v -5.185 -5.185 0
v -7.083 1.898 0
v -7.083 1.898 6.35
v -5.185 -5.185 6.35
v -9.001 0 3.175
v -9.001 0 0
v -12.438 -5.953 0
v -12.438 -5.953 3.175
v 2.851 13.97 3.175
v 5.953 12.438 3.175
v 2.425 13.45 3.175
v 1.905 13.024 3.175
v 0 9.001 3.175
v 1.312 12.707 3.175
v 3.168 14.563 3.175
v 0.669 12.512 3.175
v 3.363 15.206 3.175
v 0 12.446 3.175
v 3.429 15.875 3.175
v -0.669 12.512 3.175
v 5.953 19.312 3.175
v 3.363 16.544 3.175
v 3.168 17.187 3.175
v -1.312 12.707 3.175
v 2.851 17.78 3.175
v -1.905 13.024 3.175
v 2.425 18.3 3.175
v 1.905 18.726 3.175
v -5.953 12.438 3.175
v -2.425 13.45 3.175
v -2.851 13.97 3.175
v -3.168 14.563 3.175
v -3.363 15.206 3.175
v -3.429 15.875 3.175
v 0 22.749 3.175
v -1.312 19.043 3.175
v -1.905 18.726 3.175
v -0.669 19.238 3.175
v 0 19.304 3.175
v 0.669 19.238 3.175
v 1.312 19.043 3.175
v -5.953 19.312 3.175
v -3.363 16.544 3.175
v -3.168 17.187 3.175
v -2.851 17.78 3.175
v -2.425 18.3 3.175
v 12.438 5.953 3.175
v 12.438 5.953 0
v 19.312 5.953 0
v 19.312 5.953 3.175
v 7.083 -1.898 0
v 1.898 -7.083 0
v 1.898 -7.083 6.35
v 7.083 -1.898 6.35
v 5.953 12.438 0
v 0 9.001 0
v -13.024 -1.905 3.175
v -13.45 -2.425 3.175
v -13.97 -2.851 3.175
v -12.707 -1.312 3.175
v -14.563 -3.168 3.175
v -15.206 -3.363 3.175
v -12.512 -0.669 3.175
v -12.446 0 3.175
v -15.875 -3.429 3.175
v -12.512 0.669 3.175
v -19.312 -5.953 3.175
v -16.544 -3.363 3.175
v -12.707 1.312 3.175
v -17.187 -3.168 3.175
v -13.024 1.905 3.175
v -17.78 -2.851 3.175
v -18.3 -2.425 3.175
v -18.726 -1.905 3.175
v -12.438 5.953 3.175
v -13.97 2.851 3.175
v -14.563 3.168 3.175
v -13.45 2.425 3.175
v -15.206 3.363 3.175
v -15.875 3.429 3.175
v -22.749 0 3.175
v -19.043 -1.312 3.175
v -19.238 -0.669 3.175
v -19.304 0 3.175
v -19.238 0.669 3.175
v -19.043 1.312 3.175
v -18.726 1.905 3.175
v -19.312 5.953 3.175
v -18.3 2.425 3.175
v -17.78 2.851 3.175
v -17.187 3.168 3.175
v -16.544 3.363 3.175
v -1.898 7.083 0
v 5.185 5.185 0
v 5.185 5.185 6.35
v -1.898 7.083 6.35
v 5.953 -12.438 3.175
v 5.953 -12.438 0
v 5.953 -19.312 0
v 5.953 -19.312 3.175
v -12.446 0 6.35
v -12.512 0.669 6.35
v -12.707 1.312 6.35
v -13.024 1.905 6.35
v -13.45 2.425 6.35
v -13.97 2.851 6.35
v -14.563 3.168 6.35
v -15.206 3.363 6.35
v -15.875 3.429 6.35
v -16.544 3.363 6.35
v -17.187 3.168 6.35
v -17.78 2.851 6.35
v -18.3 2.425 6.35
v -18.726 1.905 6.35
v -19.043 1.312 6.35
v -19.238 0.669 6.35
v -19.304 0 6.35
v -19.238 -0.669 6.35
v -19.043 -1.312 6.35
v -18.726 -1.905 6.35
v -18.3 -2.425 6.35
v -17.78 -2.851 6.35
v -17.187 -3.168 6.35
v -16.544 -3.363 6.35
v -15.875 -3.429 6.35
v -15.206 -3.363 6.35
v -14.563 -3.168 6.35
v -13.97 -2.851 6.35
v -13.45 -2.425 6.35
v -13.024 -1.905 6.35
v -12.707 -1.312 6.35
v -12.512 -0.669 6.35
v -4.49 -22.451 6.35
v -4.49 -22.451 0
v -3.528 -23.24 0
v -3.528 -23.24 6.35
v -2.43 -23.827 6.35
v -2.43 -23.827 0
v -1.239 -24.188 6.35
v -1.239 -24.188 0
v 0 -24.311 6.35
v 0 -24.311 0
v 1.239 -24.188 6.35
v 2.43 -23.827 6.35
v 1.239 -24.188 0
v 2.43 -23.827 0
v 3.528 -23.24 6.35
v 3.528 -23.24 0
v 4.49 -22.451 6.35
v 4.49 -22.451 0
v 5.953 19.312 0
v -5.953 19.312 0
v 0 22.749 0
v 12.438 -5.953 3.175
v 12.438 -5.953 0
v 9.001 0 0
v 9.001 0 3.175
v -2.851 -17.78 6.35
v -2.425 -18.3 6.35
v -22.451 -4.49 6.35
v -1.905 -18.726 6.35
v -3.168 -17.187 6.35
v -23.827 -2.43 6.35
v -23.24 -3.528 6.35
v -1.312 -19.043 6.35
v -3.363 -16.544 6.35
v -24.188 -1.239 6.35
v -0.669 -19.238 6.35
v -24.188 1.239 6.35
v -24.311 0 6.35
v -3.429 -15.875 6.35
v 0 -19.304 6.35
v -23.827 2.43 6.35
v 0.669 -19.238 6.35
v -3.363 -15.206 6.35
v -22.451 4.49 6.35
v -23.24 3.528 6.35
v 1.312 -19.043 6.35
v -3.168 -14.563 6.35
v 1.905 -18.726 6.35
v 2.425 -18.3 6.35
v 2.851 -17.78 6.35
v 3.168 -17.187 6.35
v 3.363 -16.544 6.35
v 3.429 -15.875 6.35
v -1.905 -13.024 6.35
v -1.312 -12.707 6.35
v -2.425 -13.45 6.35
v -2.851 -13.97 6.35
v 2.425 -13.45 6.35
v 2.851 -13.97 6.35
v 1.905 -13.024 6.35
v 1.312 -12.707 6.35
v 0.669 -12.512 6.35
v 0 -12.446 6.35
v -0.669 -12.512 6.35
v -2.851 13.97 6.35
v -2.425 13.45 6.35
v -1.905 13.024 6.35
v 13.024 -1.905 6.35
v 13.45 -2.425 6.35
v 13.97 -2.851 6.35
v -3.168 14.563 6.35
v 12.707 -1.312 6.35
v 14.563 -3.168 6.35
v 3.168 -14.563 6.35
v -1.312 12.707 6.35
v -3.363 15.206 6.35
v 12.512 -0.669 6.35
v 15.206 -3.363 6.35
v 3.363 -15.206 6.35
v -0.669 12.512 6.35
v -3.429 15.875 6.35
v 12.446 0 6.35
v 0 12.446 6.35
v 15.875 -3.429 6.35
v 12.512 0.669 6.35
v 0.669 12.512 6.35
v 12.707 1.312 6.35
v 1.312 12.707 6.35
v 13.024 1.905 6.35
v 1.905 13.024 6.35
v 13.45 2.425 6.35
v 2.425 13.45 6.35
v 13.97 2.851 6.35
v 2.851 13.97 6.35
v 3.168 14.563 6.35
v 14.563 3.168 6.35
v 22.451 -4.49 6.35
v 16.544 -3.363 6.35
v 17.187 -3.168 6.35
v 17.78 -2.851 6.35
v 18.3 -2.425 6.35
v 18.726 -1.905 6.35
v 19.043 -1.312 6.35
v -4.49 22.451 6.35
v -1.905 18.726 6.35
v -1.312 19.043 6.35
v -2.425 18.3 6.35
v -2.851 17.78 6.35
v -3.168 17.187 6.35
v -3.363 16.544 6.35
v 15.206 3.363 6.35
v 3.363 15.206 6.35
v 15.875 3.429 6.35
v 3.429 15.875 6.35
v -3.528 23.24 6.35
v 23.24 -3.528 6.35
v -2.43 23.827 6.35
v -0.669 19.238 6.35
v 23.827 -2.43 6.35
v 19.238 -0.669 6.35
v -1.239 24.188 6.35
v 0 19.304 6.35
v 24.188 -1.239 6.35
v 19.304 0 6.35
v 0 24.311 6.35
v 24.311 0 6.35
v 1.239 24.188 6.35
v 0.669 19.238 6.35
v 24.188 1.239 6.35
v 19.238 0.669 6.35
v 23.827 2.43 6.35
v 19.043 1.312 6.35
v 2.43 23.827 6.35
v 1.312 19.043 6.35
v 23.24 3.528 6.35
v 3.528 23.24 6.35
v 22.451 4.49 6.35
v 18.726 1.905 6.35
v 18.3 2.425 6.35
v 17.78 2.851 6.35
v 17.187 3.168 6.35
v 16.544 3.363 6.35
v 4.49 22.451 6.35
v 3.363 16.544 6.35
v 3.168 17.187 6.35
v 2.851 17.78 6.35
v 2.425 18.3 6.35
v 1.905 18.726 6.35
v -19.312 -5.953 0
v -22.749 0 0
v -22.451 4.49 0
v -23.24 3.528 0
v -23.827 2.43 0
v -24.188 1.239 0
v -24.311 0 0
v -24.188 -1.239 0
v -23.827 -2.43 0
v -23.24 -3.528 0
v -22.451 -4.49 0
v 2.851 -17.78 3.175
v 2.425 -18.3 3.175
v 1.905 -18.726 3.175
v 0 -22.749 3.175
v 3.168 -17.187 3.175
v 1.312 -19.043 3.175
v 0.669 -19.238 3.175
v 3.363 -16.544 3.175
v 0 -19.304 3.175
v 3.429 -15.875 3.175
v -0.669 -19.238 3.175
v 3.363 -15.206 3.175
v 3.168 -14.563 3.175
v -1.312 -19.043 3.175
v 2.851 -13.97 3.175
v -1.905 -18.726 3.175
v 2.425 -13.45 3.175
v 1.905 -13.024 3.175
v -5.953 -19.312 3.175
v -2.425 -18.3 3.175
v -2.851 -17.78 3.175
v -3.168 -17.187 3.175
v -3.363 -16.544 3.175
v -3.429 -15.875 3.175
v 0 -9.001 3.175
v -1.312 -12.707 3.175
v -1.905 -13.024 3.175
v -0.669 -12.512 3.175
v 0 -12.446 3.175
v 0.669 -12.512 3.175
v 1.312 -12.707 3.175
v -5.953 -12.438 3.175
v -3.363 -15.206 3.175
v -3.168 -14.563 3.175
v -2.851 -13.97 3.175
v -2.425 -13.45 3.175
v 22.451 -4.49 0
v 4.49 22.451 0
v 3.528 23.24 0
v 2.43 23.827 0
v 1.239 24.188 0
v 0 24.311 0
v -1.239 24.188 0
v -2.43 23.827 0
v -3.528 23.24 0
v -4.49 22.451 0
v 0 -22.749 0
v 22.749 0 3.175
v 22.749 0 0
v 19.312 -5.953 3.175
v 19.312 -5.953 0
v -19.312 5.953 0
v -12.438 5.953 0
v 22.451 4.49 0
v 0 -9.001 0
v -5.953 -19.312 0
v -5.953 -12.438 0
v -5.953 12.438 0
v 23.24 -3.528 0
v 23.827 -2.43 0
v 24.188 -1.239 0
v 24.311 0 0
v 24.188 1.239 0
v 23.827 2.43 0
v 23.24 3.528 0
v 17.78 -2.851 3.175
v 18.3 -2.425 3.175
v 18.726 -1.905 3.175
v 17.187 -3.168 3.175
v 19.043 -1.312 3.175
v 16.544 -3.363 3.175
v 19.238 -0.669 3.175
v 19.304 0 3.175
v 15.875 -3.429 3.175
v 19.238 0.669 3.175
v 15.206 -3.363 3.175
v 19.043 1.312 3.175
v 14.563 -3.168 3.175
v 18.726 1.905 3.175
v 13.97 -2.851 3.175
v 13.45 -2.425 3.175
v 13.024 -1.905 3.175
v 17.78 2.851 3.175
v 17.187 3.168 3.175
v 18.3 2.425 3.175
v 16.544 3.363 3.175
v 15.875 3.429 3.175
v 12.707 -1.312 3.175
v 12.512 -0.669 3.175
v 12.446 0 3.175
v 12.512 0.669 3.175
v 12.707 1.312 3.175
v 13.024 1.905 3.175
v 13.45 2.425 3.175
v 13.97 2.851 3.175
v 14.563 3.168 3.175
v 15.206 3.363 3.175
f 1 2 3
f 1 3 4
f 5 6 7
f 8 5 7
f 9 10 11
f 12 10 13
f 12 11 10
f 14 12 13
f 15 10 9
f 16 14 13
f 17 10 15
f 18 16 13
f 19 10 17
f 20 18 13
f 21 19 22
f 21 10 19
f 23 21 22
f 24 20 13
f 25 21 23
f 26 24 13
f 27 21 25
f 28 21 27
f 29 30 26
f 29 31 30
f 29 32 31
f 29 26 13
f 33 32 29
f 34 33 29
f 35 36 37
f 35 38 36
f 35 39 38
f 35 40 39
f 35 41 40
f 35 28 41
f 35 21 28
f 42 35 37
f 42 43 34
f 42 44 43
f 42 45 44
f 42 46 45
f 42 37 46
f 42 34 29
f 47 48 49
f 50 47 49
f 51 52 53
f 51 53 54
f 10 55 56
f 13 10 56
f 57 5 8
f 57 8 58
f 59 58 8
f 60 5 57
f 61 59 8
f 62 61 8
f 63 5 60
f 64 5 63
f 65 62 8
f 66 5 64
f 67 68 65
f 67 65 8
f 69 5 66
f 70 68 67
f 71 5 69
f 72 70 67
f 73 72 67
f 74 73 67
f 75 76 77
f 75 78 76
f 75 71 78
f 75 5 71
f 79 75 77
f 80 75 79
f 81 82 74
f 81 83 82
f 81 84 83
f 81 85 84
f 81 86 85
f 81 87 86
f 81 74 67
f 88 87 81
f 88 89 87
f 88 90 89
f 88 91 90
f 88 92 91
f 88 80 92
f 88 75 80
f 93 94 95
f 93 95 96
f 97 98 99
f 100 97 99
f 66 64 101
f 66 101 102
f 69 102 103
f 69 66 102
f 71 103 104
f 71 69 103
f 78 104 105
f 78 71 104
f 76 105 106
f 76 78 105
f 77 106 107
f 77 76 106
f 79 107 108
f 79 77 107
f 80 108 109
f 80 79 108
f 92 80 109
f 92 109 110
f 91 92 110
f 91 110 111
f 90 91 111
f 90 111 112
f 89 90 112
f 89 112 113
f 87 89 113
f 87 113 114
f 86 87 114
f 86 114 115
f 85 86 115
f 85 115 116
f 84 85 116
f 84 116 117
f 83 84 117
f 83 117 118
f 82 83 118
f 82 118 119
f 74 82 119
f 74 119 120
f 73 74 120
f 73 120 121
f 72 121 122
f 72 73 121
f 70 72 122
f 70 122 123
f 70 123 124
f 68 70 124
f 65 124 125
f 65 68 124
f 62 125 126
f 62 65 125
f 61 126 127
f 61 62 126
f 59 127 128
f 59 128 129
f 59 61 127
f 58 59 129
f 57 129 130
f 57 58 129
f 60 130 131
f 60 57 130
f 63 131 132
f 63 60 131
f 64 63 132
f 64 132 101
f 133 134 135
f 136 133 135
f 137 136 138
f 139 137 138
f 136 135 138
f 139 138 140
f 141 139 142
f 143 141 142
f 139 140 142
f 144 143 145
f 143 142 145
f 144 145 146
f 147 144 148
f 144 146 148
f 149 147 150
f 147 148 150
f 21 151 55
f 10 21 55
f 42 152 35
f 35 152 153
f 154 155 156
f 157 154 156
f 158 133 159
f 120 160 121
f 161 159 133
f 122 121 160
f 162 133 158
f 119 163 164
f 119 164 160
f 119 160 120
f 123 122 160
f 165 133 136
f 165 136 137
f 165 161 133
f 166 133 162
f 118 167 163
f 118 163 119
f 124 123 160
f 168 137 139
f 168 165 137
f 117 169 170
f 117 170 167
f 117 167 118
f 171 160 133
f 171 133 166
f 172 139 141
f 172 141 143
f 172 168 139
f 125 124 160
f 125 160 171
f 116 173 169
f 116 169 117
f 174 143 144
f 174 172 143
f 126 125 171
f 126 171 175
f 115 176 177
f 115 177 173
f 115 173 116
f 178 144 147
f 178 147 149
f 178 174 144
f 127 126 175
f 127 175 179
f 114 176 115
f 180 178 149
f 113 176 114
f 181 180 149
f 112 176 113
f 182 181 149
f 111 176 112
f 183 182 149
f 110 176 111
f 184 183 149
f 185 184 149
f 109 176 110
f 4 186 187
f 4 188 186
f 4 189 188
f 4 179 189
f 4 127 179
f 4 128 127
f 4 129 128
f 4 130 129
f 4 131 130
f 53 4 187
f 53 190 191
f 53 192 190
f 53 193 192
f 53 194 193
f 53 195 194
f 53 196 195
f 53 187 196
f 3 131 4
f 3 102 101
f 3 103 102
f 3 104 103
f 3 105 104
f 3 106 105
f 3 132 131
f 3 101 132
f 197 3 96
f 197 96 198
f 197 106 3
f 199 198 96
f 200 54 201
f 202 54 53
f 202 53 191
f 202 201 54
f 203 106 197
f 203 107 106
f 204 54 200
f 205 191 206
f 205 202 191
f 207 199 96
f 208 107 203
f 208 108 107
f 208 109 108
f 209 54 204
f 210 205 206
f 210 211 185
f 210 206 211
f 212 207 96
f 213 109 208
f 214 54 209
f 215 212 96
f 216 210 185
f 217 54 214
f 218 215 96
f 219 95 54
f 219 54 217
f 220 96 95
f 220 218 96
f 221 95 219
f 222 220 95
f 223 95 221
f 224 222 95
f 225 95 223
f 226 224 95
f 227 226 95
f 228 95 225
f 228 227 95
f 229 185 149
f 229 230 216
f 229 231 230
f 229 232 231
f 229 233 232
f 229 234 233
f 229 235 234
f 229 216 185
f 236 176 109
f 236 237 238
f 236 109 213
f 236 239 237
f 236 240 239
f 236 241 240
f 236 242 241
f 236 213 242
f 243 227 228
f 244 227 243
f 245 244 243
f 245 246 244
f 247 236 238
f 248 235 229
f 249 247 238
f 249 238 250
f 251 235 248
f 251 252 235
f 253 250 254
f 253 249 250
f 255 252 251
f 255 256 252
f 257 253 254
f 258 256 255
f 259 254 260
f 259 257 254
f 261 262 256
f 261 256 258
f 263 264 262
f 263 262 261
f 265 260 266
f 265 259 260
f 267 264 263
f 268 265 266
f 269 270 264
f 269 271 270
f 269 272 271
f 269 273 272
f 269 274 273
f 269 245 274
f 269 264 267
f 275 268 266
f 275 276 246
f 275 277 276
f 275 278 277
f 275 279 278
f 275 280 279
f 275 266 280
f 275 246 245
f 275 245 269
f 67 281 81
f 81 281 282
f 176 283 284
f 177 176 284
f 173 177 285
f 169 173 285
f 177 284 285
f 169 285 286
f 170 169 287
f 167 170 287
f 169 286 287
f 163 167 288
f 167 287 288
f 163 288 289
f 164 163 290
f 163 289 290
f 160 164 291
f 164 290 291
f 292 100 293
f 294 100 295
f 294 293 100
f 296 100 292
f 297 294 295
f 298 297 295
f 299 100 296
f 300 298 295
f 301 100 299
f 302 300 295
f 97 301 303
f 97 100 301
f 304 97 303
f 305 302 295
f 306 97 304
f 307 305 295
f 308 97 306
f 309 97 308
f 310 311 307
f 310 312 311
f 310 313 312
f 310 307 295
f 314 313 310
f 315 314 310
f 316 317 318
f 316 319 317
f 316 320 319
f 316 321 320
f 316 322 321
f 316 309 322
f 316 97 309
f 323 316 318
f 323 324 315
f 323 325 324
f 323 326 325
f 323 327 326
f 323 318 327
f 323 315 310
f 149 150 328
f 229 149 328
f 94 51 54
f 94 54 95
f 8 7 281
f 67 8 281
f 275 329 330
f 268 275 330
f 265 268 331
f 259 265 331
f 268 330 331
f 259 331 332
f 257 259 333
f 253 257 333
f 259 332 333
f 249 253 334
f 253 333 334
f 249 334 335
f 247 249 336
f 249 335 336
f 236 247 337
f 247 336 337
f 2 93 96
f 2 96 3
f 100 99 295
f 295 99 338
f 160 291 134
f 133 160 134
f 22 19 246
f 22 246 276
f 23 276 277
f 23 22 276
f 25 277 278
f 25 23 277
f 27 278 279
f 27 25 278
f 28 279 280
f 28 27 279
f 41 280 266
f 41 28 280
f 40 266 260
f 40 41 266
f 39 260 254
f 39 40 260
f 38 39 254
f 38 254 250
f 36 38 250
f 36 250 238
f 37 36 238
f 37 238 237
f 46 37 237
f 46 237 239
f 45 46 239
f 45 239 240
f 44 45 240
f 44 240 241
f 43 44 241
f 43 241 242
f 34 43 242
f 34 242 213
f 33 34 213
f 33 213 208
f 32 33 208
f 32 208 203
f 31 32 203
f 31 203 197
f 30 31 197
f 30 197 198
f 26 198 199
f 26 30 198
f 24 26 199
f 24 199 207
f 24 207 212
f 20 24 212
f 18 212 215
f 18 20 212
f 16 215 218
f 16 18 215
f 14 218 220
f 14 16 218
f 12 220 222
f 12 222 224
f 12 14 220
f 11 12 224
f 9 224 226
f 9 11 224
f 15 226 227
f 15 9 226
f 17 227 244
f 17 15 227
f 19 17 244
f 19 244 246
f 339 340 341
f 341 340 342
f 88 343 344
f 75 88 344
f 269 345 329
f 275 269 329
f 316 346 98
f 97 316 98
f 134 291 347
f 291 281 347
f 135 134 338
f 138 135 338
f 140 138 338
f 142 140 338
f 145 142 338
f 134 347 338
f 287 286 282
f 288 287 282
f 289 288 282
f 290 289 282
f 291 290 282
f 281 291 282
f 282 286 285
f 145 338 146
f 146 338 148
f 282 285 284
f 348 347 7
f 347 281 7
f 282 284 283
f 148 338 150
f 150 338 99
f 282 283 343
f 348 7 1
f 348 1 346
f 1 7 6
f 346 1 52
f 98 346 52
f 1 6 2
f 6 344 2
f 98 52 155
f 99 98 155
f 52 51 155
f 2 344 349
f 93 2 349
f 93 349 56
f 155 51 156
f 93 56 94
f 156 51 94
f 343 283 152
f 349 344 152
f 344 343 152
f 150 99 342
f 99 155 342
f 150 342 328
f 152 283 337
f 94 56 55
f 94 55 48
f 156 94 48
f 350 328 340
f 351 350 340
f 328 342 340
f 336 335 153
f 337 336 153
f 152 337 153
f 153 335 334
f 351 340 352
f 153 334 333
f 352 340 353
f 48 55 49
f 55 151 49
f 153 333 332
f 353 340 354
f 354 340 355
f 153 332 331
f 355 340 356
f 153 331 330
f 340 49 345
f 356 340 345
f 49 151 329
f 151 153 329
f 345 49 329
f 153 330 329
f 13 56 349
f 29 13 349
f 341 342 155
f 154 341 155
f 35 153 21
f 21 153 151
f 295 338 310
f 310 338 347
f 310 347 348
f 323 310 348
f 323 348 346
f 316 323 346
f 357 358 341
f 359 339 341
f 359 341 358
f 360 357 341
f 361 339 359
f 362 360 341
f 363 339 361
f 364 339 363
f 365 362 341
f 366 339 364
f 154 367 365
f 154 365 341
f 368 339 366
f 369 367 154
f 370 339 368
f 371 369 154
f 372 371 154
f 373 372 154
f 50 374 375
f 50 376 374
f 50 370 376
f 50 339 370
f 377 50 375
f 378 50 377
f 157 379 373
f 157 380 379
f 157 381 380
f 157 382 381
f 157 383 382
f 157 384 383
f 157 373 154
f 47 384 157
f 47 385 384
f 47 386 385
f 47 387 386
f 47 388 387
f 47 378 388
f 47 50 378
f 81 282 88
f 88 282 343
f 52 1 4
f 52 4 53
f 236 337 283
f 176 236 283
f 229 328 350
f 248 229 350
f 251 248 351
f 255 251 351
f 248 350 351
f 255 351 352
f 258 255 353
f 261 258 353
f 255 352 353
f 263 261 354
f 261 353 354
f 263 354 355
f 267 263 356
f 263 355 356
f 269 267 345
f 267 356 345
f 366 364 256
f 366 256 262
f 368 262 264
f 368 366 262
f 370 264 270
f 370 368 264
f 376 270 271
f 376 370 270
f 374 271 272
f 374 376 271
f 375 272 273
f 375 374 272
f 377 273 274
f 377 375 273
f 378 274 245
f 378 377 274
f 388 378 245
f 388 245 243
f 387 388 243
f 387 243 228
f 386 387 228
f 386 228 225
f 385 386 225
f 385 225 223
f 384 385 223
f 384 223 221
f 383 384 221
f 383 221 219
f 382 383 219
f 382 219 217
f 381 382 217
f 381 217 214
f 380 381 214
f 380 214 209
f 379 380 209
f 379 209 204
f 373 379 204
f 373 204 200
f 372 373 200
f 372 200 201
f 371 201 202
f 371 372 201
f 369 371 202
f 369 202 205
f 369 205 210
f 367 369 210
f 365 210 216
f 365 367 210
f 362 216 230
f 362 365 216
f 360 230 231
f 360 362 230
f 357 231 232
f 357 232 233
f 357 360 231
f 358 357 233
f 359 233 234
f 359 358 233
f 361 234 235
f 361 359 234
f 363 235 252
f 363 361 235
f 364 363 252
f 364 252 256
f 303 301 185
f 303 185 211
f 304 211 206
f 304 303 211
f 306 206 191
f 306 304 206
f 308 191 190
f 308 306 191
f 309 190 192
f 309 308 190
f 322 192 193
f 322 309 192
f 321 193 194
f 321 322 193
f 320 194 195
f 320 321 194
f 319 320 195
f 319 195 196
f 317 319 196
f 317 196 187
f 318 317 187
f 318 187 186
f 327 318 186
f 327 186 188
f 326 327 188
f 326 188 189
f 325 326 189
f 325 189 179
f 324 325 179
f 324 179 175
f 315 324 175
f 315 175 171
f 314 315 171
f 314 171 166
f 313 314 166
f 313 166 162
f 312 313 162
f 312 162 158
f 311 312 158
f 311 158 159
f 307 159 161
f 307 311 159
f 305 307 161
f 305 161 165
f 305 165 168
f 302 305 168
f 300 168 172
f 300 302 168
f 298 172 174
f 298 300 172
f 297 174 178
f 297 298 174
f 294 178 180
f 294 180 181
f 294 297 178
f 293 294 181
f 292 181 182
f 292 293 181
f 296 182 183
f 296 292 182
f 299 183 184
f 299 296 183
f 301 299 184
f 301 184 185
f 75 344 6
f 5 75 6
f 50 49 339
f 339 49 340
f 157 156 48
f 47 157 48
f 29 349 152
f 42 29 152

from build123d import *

# Parameters (mm, degrees)
SKETCH2_R           = 3.429
BOSS_EXTRUDE1_DEPTH = 6.35
CUT_EXTRUDE1_DEPTH  = 3.175


with BuildPart() as part:
    # Sketch2 → Boss-Extrude1 (new body)
    with BuildSketch(Plane.XY):
        with BuildLine():
            Line((-4.490128061, 22.450640303), (-22.450640303, 4.490128061))
            ThreePointArc((-22.450640303, 4.490128061), (-24.310512242, 0), (-22.450640303, -4.490128061))
            Line((-22.450640303, -4.490128061), (-4.490128061, -22.450640303))
            ThreePointArc((-4.490128061, -22.450640303), (0, -24.310512242), (4.490128061, -22.450640303))
            Line((4.490128061, -22.450640303), (22.450640303, -4.490128061))
            ThreePointArc((22.450640303, -4.490128061), (24.310512242, 0), (22.450640303, 4.490128061))
            Line((22.450640303, 4.490128061), (4.490128061, 22.450640303))
            ThreePointArc((4.490128061, 22.450640303), (0, 24.310512242), (-4.490128061, 22.450640303))
        make_face()
        with Locations((0, 15.875)):
            Circle(SKETCH2_R, mode=Mode.SUBTRACT)
        with Locations((15.875, 0)):
            Circle(SKETCH2_R, mode=Mode.SUBTRACT)
        with Locations((0, -15.875)):
            Circle(SKETCH2_R, mode=Mode.SUBTRACT)
        with Locations((-15.875, 0)):
            Circle(SKETCH2_R, mode=Mode.SUBTRACT)
        Polygon((5.184753289, 5.184753289), (-1.897751416, 7.082504705), (-7.082504705, 1.897751416), (-5.184753289, -5.184753289), (1.897751416, -7.082504705), (7.082504705, -1.897751416), align=None, mode=Mode.SUBTRACT)
    extrude(amount=BOSS_EXTRUDE1_DEPTH)

    # Sketch3 → Cut-Extrude1 (cut)
    with BuildSketch(Plane(origin=(0, 0, 0), x_dir=(-1, 0, 0), z_dir=(0, 0, -1))):
        Polygon((5.953125, 19.312038321), (0, 22.749076643), (-5.953125, 19.312038321), (-5.953125, 12.437961679), (0, 9.000923357), (5.953125, 12.437961679), align=None)
        Polygon((12.437961679, -5.953125), (19.312038321, -5.953125), (22.749076643, 0), (19.312038321, 5.953125), (12.437961679, 5.953125), (9.000923357, 0), align=None)
        Polygon((-5.953125, -12.437961679), (-5.953125, -19.312038321), (0, -22.749076643), (5.953125, -19.312038321), (5.953125, -12.437961679), (0, -9.000923357), align=None)
        Polygon((-12.437961679, 5.953125), (-19.312038321, 5.953125), (-22.749076643, 0), (-19.312038321, -5.953125), (-12.437961679, -5.953125), (-9.000923357, 0), align=None)
    extrude(amount=-CUT_EXTRUDE1_DEPTH, mode=Mode.SUBTRACT)


solid = part.part
